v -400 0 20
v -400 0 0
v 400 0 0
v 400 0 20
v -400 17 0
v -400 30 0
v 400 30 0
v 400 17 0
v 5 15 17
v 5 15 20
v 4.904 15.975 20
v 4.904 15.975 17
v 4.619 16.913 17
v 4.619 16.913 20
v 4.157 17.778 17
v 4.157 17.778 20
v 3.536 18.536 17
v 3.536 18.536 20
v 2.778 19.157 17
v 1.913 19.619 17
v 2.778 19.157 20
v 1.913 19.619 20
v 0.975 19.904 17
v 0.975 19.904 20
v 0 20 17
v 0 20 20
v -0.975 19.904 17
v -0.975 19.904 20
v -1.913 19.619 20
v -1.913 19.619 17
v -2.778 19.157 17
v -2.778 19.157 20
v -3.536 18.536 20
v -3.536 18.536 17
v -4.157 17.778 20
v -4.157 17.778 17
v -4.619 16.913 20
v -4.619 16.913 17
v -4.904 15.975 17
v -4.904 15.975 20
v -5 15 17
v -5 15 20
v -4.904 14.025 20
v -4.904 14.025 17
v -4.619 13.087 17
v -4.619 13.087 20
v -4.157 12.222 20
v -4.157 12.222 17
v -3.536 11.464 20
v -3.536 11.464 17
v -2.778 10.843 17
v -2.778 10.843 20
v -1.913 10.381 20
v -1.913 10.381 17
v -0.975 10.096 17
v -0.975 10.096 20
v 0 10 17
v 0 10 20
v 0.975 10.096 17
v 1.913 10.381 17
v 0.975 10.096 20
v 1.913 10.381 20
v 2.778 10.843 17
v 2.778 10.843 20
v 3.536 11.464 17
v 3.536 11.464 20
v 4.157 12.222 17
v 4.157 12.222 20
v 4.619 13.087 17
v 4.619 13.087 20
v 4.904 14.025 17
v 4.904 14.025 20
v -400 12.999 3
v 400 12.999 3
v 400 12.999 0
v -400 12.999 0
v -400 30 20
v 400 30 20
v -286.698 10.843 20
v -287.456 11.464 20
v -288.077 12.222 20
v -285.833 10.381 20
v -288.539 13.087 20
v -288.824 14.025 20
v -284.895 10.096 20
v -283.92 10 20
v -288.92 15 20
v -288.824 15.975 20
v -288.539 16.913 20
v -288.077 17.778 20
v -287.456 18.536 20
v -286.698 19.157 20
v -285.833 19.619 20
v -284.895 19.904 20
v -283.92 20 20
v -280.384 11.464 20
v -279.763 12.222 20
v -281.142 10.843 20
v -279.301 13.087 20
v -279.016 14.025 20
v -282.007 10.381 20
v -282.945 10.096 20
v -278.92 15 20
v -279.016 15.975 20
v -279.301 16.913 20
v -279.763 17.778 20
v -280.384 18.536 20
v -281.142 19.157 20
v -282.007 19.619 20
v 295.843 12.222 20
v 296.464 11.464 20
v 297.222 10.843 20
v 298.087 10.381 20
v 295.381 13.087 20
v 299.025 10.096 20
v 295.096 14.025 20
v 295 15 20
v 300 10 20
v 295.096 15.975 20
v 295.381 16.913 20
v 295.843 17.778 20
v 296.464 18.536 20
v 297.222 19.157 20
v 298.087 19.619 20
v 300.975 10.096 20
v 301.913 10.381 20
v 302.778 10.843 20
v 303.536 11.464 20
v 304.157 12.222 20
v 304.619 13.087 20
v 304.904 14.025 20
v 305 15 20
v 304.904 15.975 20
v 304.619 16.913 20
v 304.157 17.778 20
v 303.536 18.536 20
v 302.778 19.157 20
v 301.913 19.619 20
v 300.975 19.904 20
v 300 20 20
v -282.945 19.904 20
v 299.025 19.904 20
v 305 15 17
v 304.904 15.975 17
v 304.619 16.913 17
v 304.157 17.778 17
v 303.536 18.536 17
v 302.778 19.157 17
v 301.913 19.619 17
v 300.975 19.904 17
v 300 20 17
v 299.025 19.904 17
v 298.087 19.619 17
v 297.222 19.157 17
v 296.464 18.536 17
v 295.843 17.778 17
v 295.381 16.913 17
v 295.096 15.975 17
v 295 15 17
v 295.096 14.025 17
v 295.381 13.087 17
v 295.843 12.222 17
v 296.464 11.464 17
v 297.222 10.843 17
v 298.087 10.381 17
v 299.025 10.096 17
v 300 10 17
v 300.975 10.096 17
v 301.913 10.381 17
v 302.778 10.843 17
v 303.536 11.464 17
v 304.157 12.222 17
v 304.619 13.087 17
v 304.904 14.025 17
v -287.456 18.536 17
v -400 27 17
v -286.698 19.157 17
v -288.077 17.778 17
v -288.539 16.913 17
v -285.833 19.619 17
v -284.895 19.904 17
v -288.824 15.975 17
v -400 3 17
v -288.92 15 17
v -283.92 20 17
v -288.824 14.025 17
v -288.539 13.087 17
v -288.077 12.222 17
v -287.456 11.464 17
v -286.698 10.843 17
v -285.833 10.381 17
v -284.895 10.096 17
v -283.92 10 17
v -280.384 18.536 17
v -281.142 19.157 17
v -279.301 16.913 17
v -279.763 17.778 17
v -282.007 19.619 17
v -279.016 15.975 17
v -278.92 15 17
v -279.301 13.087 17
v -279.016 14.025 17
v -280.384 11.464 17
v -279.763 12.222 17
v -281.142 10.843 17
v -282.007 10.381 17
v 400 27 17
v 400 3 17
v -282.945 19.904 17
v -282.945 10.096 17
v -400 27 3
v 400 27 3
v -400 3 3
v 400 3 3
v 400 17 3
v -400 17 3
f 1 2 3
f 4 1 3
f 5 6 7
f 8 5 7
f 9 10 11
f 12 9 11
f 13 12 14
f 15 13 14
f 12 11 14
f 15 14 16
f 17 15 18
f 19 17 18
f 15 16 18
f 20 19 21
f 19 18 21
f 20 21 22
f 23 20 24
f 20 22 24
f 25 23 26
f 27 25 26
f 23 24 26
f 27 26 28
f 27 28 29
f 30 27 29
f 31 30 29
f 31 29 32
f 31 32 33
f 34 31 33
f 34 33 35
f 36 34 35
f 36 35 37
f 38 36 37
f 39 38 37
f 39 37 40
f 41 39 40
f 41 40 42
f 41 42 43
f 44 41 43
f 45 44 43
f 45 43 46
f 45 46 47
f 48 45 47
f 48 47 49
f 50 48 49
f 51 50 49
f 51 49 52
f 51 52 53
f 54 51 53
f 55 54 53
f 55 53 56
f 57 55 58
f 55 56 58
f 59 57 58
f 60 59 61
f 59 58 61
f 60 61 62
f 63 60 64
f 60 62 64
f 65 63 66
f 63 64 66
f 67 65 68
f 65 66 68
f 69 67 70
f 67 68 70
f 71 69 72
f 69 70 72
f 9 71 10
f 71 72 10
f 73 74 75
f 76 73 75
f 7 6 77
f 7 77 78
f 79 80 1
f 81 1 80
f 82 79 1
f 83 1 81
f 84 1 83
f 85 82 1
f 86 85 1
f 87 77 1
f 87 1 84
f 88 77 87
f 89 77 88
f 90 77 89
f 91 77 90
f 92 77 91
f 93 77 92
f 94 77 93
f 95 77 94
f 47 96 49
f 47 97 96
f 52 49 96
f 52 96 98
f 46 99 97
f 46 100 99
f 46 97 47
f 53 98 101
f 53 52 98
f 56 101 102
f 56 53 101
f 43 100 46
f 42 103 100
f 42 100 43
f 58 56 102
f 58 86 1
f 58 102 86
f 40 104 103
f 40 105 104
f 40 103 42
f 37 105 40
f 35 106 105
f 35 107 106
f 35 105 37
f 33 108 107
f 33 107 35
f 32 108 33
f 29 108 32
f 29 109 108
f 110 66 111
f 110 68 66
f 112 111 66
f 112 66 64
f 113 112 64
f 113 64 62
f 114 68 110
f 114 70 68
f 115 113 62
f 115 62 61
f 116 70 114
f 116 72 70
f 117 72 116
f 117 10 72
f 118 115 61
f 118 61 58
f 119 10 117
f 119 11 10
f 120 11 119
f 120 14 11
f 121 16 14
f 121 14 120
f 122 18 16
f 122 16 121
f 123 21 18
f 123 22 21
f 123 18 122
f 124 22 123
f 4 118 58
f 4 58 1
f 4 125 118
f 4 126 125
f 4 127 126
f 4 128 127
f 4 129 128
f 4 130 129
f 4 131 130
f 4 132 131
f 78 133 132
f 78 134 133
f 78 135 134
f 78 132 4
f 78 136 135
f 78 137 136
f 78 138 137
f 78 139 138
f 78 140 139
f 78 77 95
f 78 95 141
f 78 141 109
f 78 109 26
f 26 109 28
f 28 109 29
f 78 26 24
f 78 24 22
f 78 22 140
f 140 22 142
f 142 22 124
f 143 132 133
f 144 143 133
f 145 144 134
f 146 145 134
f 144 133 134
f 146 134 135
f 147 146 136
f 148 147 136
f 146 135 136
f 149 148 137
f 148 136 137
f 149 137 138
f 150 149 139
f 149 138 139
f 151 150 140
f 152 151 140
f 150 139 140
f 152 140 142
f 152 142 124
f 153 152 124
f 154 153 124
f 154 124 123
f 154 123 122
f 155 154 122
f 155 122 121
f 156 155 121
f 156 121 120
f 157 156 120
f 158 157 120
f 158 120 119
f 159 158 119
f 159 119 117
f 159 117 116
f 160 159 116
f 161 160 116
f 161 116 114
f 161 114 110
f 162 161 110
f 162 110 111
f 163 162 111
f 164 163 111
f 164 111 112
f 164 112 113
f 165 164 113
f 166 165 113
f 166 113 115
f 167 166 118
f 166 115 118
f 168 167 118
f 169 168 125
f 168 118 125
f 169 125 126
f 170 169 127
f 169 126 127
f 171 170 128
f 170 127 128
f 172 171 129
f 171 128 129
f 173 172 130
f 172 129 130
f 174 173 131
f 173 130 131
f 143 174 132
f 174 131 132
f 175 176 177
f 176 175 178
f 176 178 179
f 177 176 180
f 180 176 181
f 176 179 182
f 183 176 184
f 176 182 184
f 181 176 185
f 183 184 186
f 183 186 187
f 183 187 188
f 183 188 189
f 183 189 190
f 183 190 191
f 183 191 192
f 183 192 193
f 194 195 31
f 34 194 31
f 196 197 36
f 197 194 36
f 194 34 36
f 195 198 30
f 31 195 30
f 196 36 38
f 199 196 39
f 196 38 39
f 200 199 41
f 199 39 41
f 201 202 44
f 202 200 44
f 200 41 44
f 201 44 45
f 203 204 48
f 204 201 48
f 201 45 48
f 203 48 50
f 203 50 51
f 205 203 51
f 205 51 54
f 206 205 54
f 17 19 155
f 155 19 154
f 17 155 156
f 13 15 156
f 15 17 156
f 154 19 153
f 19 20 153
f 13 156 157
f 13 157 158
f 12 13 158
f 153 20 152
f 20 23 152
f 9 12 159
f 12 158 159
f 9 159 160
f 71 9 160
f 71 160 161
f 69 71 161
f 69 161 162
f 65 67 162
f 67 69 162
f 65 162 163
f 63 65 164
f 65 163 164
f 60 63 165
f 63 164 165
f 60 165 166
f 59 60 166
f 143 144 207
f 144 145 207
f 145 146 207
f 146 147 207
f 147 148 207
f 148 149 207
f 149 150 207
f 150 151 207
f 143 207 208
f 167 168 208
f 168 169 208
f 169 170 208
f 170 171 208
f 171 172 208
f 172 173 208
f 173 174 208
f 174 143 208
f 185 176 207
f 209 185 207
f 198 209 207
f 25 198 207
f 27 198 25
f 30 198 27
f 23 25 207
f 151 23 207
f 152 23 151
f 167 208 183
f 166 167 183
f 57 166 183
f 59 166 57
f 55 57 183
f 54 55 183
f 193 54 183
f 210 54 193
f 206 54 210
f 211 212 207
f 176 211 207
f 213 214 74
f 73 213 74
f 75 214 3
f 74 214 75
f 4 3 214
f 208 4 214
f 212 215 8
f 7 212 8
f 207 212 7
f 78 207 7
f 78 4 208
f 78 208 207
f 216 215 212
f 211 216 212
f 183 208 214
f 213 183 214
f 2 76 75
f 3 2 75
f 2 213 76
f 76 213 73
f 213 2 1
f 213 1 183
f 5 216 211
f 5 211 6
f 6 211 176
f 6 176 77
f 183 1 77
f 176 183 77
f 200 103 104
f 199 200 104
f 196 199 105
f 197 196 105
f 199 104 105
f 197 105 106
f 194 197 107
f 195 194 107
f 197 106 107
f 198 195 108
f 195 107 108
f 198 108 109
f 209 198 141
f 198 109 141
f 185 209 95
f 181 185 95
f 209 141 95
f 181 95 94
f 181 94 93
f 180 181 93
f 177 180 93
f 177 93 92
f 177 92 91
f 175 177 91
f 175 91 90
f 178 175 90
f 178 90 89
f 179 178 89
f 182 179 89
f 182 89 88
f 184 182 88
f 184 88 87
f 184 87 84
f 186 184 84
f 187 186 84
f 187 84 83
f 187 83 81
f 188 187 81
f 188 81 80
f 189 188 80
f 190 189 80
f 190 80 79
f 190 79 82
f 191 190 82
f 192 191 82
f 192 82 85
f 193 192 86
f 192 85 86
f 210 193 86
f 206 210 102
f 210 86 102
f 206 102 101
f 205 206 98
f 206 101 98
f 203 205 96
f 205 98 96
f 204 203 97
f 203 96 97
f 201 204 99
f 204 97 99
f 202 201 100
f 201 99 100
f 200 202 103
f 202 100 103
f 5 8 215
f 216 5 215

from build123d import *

# Parameters (mm, degrees)
CROQUIS1_W              = 1000
CROQUIS1_H              = 30
SALIENTE_EXTRUIR1_DEPTH = 20
CORTAR_EXTRUIR1_DEPTH   = 1001.649788887
CROQUIS3_W              = 100
CROQUIS3_H              = 30
CORTAR_EXTRUIR2_DEPTH   = 502.29831438
CROQUIS4_R              = 5
CORTAR_EXTRUIR3_DEPTH   = 10


with BuildPart() as part:
    # Croquis1 → Saliente-Extruir1 (new body)
    with BuildSketch(Plane.XY):
        with Locations((0, 15)):
            Rectangle(CROQUIS1_W, CROQUIS1_H)
    extrude(amount=SALIENTE_EXTRUIR1_DEPTH)

    # Croquis2 → Cortar-Extruir1 (cut, through all)
    with BuildSketch(Plane(origin=(500, 0, 0), x_dir=(0, 0, -1), z_dir=(1, 0, 0))):
        Polygon((-17, 27), (-17, 3), (-3, 3), (-3, 12.998729457), (0, 12.998729457), (0, 17), (-3, 17), (-3, 27), align=None)
    extrude(amount=-CORTAR_EXTRUIR1_DEPTH, mode=Mode.SUBTRACT)

    # Croquis3 → Cortar-Extruir2 (cut, through all)
    with BuildSketch(Plane.XY.offset(20)):
        with Locations((-450, 15)):
            Rectangle(CROQUIS3_W, CROQUIS3_H)
        with Locations((450, 15)):
            Rectangle(CROQUIS3_W, CROQUIS3_H)
    extrude(amount=-CORTAR_EXTRUIR2_DEPTH, mode=Mode.SUBTRACT)

    # Croquis4 → Cortar-Extruir3 (cut)
    with BuildSketch(Plane.XY.offset(20)):
        with Locations((300, 15)):
            Circle(CROQUIS4_R)
        with Locations((0, 15)):
            Circle(CROQUIS4_R)
        with Locations((-283.92, 15)):
            Circle(CROQUIS4_R)
    extrude(amount=-CORTAR_EXTRUIR3_DEPTH, mode=Mode.SUBTRACT)


solid = part.part
